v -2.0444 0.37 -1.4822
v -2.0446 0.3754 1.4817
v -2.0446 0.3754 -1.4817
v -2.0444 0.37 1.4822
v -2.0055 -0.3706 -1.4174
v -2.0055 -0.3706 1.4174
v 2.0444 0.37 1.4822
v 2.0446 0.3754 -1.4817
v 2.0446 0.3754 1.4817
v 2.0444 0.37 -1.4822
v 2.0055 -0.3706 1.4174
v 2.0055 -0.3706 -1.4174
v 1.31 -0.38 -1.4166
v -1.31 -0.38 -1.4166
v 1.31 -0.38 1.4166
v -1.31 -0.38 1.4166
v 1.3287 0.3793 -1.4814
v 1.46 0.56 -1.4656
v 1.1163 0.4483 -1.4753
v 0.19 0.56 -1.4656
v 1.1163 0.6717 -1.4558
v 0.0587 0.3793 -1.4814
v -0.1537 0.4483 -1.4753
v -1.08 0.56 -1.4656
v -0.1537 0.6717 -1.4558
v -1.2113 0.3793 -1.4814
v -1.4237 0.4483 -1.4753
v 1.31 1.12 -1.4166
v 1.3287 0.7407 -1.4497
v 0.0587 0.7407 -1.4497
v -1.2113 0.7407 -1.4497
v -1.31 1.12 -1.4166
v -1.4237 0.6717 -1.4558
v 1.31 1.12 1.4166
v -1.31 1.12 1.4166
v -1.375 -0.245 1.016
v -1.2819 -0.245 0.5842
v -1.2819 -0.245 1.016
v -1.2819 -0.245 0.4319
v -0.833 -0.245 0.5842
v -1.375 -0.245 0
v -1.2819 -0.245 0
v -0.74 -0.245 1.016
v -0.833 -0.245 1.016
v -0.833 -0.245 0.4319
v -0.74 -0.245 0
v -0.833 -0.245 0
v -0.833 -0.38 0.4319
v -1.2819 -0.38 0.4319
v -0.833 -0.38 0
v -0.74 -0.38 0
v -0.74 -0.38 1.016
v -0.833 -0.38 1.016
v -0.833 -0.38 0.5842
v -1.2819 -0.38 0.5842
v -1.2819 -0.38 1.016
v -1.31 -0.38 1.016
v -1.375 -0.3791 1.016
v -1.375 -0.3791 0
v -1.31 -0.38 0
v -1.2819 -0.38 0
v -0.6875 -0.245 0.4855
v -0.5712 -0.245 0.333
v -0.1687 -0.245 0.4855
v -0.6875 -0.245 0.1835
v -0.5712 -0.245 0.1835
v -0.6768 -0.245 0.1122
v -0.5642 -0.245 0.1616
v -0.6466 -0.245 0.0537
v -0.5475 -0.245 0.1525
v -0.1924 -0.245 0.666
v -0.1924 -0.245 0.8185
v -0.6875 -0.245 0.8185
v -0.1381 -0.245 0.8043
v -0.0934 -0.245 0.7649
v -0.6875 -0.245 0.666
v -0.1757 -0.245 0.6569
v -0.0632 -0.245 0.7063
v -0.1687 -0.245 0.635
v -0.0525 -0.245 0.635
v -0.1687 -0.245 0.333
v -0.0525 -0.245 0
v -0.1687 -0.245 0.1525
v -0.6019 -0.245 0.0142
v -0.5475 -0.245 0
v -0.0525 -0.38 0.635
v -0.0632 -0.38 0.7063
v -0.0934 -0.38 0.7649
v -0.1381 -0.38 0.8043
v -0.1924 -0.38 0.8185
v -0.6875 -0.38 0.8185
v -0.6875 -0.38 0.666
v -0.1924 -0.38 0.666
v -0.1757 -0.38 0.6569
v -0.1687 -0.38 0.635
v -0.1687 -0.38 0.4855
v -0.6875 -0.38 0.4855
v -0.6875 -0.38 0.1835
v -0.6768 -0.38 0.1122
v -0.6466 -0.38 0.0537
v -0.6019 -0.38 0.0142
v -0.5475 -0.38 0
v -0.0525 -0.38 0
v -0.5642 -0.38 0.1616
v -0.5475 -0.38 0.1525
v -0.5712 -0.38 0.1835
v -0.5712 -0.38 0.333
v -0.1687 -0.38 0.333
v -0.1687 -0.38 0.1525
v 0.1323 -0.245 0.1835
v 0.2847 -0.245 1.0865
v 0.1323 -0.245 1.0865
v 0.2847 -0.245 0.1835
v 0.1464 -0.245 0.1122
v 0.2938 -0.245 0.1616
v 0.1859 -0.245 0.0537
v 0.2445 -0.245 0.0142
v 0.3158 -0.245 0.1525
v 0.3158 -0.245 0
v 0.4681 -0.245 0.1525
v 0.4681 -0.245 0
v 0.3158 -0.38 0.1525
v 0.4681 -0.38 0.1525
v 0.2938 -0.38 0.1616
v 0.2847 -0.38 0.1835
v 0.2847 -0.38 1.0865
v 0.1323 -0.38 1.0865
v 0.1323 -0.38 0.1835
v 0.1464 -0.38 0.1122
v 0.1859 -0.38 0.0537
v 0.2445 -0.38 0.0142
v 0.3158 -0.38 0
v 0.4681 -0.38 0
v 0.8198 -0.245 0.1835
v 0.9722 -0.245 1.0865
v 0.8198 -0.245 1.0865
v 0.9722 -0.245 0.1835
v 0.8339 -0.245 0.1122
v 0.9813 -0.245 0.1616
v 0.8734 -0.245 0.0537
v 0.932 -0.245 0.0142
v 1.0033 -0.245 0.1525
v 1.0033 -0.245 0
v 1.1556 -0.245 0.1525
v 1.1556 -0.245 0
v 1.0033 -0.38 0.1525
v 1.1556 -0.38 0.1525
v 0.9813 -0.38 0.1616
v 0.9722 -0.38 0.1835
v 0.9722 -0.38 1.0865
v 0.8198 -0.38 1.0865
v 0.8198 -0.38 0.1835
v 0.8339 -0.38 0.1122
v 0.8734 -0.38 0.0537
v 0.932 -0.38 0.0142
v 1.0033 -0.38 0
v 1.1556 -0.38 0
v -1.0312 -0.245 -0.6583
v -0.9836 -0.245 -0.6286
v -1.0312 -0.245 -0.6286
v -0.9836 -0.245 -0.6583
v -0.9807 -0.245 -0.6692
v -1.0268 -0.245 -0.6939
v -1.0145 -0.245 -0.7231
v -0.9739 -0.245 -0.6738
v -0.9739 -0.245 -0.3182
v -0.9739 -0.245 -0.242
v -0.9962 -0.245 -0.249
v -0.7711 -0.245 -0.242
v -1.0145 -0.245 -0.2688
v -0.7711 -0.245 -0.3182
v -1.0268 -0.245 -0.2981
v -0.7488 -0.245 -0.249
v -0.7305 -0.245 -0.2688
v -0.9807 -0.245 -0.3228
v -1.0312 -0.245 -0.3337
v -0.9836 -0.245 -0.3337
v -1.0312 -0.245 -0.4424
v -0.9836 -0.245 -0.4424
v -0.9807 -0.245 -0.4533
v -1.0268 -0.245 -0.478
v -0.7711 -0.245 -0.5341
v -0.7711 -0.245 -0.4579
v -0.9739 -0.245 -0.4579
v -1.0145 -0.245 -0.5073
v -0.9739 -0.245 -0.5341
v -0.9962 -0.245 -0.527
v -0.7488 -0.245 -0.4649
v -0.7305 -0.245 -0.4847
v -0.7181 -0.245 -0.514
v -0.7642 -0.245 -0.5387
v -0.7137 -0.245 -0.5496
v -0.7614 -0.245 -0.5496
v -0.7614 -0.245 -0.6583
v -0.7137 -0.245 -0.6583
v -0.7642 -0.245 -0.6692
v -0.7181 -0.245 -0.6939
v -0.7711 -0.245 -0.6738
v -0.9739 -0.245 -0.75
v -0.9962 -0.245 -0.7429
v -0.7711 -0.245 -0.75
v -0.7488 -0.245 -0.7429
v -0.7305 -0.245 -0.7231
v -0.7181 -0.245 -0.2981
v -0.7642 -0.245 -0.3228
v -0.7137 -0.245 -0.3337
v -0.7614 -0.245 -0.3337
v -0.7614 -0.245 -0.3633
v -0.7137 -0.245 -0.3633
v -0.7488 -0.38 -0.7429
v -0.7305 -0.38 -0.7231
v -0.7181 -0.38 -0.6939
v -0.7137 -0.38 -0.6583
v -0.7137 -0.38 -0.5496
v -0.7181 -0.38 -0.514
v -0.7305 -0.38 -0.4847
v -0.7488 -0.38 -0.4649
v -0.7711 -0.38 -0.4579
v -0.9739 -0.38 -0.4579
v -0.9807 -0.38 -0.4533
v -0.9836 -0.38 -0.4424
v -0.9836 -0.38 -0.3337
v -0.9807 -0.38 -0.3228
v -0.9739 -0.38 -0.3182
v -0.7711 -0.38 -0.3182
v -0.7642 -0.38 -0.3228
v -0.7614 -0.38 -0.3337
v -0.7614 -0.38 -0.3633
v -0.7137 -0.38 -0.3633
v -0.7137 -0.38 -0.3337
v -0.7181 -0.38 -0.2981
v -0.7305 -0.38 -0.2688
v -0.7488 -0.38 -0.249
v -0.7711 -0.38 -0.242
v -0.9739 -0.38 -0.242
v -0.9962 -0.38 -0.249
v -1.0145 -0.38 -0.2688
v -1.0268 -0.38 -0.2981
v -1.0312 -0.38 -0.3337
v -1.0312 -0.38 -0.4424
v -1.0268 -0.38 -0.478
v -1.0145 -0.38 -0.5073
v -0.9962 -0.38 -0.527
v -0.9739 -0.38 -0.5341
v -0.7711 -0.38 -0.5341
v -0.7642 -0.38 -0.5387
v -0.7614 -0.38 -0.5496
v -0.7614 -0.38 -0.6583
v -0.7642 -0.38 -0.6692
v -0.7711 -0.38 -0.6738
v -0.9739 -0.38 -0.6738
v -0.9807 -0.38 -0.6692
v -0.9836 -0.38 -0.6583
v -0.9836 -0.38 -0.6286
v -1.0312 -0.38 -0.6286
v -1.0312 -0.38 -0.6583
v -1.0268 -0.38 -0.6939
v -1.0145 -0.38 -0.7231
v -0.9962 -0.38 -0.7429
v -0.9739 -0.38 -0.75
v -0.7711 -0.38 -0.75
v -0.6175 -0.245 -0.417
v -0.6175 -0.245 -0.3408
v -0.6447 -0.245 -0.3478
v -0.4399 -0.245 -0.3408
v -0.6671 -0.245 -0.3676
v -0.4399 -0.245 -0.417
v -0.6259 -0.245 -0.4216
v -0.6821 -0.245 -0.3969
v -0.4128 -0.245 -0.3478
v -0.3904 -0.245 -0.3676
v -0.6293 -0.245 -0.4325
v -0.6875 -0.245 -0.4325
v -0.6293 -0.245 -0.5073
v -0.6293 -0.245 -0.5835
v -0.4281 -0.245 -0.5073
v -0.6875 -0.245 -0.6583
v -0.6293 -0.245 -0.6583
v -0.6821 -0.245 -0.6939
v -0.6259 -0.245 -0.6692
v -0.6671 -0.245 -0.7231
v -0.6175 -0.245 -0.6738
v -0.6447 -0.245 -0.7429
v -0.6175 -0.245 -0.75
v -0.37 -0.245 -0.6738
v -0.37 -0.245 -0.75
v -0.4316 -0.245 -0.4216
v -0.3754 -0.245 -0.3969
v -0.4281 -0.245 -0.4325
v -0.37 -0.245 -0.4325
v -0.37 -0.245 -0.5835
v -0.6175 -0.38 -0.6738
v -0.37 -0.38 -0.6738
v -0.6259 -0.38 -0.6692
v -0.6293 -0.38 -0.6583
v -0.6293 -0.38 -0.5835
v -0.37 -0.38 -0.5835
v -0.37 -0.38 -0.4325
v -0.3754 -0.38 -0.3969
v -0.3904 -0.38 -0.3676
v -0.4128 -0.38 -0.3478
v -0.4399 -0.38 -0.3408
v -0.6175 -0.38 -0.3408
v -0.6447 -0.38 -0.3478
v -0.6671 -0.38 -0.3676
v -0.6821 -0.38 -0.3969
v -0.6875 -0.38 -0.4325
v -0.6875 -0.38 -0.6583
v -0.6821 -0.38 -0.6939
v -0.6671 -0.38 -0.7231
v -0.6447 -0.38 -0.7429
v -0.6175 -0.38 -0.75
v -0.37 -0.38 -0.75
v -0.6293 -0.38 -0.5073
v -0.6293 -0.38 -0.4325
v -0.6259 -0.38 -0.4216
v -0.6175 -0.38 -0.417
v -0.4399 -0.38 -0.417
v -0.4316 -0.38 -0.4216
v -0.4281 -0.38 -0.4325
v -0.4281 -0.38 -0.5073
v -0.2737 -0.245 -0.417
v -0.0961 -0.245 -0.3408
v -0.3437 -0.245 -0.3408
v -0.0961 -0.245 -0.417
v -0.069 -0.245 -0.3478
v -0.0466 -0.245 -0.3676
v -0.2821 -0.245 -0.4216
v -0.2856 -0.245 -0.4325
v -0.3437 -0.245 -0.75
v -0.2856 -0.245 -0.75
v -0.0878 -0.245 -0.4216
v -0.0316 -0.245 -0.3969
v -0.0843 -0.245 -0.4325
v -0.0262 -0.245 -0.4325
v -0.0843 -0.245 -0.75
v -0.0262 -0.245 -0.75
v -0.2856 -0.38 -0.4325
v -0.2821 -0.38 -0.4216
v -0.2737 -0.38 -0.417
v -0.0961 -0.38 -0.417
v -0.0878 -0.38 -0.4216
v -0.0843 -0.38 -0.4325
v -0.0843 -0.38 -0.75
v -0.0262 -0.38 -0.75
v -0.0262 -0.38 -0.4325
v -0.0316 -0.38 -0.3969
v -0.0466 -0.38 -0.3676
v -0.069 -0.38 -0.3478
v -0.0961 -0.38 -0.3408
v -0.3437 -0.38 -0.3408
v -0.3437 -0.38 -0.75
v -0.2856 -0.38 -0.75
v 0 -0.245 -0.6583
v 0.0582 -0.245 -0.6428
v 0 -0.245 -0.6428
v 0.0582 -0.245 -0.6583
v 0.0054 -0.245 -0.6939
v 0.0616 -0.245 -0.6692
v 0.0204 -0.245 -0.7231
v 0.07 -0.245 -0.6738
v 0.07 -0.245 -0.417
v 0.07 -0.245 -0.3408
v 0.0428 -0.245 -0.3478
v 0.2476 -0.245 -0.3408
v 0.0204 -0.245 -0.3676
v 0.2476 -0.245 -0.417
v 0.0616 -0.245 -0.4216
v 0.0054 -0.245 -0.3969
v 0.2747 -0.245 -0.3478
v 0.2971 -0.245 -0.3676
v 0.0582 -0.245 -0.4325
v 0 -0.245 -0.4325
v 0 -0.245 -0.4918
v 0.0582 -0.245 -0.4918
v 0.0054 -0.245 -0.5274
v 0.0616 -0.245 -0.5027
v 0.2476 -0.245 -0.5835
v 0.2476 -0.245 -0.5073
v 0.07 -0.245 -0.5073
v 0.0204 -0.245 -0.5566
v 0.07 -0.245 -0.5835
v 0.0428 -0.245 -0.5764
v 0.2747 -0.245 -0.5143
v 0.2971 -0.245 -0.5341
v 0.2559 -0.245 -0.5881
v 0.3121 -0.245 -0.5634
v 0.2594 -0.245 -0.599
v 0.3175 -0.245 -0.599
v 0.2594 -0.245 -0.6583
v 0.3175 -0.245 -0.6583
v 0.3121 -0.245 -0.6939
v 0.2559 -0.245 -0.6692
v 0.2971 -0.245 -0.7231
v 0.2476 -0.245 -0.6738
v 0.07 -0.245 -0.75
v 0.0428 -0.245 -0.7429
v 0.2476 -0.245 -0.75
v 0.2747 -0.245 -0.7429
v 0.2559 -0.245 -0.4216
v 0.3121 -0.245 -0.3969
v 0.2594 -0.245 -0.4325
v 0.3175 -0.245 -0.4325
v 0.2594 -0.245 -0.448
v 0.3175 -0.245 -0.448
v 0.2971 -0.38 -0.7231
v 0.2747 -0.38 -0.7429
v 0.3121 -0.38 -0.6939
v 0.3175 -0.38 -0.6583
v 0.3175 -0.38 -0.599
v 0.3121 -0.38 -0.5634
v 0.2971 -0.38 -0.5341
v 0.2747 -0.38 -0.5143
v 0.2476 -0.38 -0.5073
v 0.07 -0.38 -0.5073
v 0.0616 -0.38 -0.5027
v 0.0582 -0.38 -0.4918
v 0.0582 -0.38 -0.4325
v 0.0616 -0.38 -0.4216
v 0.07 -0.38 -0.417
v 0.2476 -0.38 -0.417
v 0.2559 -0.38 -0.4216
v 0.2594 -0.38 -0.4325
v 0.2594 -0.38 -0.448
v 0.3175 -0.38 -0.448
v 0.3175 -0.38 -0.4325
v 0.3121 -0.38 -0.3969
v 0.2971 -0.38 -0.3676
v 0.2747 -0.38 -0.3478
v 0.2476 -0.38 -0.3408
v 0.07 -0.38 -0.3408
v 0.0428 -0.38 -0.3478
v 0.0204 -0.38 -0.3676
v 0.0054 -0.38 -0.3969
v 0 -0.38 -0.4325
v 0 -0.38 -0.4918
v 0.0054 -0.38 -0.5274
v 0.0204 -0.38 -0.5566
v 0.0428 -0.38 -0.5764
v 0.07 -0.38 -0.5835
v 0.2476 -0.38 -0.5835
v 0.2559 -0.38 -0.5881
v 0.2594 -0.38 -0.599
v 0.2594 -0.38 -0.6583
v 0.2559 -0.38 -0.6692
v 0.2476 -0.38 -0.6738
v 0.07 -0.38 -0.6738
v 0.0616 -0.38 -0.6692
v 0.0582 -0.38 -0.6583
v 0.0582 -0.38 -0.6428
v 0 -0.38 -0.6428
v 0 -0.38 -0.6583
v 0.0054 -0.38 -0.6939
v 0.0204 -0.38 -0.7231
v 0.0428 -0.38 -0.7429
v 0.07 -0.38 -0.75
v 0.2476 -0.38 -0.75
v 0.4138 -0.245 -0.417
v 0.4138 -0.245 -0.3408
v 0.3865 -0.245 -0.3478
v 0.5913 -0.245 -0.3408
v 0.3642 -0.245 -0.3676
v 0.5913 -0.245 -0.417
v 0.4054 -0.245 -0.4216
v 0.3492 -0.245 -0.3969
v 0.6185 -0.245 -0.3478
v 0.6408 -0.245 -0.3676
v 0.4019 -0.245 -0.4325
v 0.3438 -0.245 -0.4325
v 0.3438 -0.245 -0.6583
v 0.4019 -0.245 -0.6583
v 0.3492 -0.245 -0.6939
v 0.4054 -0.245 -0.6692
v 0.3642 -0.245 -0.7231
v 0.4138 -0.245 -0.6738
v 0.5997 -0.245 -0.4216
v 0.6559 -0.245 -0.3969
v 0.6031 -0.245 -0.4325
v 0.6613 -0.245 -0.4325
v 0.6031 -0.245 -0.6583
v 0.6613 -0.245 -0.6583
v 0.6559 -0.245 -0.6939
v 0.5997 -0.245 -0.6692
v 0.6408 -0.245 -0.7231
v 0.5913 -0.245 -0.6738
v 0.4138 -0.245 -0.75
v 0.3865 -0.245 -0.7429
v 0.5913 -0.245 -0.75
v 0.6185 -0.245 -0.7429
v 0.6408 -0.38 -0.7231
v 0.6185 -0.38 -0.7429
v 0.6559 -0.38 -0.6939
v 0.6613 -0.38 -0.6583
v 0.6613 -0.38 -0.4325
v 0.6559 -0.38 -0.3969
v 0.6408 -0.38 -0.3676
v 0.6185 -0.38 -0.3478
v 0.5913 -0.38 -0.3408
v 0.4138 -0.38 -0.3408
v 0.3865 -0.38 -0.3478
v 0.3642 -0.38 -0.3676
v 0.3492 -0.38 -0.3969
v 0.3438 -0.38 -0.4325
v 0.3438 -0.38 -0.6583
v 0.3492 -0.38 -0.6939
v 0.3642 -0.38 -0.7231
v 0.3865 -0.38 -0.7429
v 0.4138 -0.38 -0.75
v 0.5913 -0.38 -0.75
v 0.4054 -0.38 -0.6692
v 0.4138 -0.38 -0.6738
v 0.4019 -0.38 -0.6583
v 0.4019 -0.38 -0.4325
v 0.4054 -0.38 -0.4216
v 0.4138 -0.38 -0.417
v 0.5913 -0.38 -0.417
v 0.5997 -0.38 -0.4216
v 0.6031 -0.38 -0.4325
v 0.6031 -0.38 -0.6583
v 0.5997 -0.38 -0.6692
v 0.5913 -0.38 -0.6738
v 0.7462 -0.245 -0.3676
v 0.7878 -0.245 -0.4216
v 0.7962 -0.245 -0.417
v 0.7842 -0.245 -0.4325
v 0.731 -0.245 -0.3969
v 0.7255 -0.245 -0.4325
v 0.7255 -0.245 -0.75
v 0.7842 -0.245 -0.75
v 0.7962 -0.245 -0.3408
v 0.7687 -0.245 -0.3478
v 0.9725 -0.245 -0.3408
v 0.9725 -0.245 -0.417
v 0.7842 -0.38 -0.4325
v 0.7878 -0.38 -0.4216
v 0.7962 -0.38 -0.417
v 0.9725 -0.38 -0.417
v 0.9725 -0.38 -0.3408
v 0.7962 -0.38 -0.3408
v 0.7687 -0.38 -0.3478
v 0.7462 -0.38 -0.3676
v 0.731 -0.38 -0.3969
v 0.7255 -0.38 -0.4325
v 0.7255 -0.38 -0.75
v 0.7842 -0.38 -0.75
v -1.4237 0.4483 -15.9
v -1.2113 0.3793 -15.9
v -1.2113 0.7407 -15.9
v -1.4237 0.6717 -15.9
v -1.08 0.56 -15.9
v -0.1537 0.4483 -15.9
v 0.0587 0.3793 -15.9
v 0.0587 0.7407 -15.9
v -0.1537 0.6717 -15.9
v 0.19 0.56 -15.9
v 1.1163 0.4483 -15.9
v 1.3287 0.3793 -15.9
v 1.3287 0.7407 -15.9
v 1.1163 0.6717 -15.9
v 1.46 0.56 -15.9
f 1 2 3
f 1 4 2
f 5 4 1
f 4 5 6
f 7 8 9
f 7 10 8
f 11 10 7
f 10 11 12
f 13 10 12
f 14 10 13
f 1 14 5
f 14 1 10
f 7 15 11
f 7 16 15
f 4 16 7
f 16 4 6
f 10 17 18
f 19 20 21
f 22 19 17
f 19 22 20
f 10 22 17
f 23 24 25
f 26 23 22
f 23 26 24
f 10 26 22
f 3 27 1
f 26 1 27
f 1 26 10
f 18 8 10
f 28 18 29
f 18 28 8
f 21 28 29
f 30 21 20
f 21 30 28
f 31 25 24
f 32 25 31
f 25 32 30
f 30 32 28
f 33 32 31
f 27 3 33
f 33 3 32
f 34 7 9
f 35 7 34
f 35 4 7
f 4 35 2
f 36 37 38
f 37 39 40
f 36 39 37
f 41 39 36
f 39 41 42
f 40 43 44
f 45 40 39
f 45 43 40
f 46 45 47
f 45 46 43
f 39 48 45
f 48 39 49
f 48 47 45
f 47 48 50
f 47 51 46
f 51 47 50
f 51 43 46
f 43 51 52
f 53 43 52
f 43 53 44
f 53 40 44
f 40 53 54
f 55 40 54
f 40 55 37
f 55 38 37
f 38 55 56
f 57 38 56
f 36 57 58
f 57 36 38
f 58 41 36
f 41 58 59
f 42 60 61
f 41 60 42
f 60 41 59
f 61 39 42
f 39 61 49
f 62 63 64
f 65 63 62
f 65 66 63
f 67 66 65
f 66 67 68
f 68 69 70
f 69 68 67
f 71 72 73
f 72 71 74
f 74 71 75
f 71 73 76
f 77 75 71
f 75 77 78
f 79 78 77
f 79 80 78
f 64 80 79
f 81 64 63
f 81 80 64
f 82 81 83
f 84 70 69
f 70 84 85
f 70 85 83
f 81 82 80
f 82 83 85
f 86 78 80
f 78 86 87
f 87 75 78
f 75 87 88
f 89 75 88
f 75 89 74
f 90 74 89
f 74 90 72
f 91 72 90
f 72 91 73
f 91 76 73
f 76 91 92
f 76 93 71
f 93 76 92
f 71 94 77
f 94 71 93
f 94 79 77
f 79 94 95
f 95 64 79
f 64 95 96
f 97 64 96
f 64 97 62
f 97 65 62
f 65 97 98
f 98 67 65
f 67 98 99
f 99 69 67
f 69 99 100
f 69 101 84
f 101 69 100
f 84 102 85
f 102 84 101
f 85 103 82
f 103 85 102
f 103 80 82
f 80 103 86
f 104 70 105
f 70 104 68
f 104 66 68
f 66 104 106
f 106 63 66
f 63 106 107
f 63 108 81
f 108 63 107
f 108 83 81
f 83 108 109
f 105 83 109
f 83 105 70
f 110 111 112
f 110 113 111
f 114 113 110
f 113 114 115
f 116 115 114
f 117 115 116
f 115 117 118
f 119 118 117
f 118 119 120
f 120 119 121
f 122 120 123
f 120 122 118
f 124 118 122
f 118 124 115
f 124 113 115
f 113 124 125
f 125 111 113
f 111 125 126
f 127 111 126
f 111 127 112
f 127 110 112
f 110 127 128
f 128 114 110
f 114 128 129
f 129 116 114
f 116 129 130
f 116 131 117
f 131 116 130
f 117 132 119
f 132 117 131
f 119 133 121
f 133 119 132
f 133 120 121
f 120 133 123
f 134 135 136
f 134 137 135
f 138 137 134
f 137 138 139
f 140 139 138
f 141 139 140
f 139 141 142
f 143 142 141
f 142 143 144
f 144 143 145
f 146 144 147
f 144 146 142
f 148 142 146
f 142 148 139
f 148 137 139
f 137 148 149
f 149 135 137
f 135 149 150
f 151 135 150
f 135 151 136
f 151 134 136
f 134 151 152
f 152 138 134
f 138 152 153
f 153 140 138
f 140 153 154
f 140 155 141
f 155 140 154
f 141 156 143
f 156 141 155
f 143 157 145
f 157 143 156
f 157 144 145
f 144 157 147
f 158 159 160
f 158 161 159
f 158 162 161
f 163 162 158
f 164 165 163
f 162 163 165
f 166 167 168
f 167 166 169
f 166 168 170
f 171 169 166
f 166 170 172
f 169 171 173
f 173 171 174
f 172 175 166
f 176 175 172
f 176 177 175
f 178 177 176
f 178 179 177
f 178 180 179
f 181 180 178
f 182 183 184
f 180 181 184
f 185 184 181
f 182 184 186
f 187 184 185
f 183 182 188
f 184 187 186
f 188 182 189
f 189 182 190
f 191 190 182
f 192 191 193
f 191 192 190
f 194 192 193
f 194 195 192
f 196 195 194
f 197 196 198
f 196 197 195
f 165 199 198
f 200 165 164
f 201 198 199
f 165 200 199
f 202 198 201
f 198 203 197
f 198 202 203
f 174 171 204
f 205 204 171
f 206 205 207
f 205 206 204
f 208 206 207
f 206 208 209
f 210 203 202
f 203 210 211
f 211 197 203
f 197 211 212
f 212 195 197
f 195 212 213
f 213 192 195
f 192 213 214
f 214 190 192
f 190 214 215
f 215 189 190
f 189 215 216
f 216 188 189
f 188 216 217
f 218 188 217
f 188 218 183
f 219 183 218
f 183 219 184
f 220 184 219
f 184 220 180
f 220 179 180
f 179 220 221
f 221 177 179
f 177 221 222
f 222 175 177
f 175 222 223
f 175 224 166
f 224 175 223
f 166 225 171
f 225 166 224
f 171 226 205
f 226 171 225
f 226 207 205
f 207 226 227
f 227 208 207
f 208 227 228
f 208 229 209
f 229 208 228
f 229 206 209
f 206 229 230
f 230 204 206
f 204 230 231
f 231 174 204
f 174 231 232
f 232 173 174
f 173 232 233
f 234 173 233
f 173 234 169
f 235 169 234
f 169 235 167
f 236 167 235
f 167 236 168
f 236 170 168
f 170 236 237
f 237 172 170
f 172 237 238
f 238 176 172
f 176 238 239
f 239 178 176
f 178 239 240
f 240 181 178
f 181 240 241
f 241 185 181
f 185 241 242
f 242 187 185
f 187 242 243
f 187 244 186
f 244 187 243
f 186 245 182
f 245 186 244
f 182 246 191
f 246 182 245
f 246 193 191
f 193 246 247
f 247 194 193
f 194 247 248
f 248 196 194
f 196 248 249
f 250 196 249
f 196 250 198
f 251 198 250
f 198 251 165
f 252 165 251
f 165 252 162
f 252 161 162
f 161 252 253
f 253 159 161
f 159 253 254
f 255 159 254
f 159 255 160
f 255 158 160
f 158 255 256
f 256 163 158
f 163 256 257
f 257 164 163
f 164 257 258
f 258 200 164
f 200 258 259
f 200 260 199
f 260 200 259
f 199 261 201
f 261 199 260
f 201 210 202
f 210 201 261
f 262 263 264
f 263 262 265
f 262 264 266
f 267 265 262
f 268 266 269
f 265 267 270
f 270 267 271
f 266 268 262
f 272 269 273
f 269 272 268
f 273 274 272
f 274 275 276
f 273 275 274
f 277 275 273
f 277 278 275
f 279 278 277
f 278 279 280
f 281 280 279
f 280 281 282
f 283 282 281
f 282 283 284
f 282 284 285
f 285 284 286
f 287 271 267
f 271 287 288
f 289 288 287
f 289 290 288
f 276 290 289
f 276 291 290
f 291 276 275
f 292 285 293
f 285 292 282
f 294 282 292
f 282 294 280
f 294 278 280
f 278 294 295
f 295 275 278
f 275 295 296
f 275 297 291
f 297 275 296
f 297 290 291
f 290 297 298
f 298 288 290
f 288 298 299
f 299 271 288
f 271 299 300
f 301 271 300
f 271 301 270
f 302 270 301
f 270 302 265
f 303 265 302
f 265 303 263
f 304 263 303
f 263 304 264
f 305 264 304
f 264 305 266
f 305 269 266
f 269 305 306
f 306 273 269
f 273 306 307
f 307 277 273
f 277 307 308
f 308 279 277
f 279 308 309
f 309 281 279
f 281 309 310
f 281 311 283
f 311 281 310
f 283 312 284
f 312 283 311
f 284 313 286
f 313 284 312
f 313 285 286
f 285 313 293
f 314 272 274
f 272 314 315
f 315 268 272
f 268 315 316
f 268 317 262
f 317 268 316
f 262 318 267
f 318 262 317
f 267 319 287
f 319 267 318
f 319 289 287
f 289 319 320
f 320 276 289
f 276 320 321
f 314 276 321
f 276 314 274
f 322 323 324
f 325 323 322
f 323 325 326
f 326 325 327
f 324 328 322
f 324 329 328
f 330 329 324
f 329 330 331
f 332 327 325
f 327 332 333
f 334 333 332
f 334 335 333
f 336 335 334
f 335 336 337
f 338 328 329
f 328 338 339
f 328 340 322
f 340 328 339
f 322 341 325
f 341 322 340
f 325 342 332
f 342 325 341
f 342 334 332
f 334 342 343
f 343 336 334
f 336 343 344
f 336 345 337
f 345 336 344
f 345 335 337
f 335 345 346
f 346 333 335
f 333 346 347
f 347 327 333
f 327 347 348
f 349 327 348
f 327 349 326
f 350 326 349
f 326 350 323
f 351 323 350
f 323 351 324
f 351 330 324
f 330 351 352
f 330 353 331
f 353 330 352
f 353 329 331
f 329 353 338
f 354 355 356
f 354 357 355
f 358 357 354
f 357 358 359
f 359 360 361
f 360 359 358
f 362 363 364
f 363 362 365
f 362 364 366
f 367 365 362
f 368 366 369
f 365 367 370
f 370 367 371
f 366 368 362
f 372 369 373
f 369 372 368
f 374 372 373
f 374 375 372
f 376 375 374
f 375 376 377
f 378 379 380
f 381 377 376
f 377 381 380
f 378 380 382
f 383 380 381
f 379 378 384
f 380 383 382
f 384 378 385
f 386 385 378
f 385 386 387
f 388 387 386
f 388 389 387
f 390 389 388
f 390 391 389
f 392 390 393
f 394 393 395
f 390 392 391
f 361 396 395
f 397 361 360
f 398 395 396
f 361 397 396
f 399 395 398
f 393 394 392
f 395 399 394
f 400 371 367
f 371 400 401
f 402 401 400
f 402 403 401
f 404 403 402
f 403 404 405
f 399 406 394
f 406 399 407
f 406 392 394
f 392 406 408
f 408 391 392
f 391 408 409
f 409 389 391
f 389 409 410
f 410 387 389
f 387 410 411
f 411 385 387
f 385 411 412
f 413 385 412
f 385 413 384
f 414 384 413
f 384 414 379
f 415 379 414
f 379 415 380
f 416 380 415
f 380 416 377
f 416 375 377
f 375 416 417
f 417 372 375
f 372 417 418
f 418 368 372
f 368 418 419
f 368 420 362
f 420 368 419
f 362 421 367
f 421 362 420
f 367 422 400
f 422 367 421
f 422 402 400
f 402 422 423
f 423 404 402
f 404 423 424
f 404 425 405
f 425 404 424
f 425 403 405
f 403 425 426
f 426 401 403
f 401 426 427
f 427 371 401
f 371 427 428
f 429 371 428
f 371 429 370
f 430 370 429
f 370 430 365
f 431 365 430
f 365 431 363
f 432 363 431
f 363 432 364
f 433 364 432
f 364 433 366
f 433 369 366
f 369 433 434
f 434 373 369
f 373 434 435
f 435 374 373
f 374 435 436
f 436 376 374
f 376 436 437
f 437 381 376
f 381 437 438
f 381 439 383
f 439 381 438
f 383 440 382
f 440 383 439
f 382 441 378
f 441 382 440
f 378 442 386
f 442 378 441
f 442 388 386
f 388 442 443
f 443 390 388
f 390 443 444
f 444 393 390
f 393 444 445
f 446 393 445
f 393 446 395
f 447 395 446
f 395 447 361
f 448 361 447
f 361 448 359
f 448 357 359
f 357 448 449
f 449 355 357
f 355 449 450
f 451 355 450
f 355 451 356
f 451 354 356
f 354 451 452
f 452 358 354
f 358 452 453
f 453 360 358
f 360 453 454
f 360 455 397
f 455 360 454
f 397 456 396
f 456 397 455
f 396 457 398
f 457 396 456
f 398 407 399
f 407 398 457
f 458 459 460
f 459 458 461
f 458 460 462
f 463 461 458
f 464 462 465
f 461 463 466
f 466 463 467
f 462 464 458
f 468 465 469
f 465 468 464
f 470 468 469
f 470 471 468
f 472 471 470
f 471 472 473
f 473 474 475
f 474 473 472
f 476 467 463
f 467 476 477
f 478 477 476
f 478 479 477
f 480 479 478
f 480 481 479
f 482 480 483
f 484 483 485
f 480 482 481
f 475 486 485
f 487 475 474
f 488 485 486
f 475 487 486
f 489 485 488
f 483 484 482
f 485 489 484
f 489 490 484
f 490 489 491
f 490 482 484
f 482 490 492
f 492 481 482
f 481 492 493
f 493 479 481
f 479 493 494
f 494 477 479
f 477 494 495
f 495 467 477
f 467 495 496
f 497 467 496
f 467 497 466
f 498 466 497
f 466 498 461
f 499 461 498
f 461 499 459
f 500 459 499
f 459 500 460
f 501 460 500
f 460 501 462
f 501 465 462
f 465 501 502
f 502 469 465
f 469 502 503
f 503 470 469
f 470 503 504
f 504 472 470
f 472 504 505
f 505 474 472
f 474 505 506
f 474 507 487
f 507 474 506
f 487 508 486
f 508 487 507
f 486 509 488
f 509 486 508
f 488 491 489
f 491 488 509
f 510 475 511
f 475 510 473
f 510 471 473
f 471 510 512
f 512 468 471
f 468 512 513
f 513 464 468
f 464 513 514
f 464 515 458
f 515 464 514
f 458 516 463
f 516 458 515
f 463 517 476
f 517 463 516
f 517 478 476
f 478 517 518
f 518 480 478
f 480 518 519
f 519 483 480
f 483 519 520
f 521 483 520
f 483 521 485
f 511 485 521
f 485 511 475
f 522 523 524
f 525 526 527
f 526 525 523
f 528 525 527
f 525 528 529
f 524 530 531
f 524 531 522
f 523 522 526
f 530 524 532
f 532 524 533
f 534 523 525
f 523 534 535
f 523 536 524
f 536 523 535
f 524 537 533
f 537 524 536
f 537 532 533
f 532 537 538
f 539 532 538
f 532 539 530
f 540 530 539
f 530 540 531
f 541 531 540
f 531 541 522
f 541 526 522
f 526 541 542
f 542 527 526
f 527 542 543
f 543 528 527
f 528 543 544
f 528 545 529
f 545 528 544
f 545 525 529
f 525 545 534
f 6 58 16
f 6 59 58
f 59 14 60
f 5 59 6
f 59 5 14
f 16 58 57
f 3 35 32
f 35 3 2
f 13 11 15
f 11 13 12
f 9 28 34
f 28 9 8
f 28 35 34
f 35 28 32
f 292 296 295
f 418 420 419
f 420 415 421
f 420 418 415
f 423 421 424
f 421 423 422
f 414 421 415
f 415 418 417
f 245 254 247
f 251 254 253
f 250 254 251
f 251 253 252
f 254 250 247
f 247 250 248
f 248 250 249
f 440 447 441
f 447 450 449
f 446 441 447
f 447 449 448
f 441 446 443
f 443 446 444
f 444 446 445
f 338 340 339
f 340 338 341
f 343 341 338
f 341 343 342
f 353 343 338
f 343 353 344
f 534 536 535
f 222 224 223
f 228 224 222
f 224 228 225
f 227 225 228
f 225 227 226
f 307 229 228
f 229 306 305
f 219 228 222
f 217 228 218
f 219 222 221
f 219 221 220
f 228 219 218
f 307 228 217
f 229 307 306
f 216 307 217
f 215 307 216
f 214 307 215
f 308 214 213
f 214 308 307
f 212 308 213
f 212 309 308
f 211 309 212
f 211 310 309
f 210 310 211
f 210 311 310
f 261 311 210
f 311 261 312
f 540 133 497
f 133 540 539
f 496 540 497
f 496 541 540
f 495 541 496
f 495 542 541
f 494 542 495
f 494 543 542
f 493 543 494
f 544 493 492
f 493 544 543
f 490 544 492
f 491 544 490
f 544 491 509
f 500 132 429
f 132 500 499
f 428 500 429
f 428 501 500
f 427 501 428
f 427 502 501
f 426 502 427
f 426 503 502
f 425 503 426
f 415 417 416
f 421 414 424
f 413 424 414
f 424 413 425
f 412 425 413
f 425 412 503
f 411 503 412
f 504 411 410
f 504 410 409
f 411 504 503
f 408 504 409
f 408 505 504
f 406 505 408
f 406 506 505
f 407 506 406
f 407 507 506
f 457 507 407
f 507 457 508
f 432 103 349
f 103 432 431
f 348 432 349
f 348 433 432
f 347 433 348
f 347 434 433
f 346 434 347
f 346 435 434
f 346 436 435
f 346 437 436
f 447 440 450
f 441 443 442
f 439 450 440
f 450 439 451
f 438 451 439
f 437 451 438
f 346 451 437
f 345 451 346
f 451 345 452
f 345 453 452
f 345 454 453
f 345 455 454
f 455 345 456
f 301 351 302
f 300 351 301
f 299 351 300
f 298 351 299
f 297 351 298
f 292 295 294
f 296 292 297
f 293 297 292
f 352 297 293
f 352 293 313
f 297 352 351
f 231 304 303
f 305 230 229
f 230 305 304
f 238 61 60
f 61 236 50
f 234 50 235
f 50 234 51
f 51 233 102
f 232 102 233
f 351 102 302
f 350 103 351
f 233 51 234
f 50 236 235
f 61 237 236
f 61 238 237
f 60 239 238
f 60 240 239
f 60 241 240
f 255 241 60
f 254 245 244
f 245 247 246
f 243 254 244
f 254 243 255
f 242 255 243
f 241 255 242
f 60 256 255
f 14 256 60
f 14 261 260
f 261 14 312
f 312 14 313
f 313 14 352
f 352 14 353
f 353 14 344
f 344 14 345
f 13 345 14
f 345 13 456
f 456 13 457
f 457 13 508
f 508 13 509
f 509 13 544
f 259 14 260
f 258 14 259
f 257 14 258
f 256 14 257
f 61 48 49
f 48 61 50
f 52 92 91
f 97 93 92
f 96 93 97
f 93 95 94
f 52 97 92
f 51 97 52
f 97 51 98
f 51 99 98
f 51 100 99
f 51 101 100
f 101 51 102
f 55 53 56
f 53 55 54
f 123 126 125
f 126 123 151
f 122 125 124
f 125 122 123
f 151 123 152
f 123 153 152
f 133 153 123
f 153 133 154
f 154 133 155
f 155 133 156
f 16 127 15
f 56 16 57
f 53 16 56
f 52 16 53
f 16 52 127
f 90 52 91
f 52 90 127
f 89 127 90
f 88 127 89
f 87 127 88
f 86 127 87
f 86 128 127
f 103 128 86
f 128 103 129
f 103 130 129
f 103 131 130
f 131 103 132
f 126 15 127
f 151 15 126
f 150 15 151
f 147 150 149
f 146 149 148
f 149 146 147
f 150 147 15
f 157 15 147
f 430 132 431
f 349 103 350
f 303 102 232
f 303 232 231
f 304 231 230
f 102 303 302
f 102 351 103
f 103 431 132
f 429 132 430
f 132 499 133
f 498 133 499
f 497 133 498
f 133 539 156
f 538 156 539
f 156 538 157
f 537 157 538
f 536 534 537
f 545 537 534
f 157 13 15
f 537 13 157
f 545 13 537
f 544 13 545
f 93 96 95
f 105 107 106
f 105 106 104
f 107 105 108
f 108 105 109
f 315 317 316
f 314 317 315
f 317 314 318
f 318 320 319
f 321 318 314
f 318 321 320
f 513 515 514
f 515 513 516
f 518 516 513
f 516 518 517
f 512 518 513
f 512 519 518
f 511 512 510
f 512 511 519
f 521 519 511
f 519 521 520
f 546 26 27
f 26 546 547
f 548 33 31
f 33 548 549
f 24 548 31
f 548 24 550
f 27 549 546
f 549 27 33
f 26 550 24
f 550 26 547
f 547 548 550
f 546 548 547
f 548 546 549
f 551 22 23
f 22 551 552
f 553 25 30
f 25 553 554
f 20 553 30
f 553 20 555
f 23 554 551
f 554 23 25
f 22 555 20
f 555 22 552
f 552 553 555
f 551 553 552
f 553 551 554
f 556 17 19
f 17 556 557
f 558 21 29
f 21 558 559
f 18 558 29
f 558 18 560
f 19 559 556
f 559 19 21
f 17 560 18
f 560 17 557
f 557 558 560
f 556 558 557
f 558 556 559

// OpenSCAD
use <Write/Write.scad>

module hall_sensor(sensor_height = 3.00, sensor_width = 4.10, sensor_depth = 0.74, sensor_trapz_width = 2.62, sensor_trapz_depth = 1.50, sensor_leg_diameter = 0.38, sensor_leg_height = 14.5, sensor_leg_distance = 1.27, include_legs = true)
{
difference()
{
    // Hull of the sensor
    hull()
    {
        cube([sensor_width, sensor_depth, sensor_height], center=true);
        translate([0,sensor_depth/2,0])
            cube([sensor_trapz_width, sensor_trapz_depth, sensor_height], center=true);
    }

    // Angular cuts
    for(i=[-1,1])
    translate([(sensor_width/2)*i,0,0])
    rotate([0,0,-3*i])
    cube([0.05,1,sensor_height+0.1],center=true);

    for(i=[-1,1])
    translate([0,0,(sensor_height/2)*i])
    rotate([5*i,0,0])
    cube([sensor_width,sensor_depth+0.1,0.1],center=true);

    for(i=[-1,1])
    translate([0,sensor_depth,(sensor_height/2)*i])
    rotate([-5*i,0,0])
    cube([sensor_width, sensor_trapz_depth/2+0.1,0.1],center=true);

    translate([0,-sensor_depth/2,0.5])
    rotate([90,0,0])
    write("Hall", center=true, t=0.25, h=1, font="orbitron.dxf");

    translate([0,-sensor_depth/2,-0.5])
    rotate([90,0,0])
    write("Sensor", center=true, t=0.25, h=0.5, font="orbitron.dxf");
}
if(include_legs == true)
{
        for(i=[-1:1])
        translate([sensor_leg_distance*i,sensor_depth/2+sensor_leg_diameter/2,-sensor_leg_height/2-sensor_height/2+0.1])
        cylinder(r=sensor_leg_diameter/2, h=sensor_leg_height, center=true);
}
}

hall_sensor();
